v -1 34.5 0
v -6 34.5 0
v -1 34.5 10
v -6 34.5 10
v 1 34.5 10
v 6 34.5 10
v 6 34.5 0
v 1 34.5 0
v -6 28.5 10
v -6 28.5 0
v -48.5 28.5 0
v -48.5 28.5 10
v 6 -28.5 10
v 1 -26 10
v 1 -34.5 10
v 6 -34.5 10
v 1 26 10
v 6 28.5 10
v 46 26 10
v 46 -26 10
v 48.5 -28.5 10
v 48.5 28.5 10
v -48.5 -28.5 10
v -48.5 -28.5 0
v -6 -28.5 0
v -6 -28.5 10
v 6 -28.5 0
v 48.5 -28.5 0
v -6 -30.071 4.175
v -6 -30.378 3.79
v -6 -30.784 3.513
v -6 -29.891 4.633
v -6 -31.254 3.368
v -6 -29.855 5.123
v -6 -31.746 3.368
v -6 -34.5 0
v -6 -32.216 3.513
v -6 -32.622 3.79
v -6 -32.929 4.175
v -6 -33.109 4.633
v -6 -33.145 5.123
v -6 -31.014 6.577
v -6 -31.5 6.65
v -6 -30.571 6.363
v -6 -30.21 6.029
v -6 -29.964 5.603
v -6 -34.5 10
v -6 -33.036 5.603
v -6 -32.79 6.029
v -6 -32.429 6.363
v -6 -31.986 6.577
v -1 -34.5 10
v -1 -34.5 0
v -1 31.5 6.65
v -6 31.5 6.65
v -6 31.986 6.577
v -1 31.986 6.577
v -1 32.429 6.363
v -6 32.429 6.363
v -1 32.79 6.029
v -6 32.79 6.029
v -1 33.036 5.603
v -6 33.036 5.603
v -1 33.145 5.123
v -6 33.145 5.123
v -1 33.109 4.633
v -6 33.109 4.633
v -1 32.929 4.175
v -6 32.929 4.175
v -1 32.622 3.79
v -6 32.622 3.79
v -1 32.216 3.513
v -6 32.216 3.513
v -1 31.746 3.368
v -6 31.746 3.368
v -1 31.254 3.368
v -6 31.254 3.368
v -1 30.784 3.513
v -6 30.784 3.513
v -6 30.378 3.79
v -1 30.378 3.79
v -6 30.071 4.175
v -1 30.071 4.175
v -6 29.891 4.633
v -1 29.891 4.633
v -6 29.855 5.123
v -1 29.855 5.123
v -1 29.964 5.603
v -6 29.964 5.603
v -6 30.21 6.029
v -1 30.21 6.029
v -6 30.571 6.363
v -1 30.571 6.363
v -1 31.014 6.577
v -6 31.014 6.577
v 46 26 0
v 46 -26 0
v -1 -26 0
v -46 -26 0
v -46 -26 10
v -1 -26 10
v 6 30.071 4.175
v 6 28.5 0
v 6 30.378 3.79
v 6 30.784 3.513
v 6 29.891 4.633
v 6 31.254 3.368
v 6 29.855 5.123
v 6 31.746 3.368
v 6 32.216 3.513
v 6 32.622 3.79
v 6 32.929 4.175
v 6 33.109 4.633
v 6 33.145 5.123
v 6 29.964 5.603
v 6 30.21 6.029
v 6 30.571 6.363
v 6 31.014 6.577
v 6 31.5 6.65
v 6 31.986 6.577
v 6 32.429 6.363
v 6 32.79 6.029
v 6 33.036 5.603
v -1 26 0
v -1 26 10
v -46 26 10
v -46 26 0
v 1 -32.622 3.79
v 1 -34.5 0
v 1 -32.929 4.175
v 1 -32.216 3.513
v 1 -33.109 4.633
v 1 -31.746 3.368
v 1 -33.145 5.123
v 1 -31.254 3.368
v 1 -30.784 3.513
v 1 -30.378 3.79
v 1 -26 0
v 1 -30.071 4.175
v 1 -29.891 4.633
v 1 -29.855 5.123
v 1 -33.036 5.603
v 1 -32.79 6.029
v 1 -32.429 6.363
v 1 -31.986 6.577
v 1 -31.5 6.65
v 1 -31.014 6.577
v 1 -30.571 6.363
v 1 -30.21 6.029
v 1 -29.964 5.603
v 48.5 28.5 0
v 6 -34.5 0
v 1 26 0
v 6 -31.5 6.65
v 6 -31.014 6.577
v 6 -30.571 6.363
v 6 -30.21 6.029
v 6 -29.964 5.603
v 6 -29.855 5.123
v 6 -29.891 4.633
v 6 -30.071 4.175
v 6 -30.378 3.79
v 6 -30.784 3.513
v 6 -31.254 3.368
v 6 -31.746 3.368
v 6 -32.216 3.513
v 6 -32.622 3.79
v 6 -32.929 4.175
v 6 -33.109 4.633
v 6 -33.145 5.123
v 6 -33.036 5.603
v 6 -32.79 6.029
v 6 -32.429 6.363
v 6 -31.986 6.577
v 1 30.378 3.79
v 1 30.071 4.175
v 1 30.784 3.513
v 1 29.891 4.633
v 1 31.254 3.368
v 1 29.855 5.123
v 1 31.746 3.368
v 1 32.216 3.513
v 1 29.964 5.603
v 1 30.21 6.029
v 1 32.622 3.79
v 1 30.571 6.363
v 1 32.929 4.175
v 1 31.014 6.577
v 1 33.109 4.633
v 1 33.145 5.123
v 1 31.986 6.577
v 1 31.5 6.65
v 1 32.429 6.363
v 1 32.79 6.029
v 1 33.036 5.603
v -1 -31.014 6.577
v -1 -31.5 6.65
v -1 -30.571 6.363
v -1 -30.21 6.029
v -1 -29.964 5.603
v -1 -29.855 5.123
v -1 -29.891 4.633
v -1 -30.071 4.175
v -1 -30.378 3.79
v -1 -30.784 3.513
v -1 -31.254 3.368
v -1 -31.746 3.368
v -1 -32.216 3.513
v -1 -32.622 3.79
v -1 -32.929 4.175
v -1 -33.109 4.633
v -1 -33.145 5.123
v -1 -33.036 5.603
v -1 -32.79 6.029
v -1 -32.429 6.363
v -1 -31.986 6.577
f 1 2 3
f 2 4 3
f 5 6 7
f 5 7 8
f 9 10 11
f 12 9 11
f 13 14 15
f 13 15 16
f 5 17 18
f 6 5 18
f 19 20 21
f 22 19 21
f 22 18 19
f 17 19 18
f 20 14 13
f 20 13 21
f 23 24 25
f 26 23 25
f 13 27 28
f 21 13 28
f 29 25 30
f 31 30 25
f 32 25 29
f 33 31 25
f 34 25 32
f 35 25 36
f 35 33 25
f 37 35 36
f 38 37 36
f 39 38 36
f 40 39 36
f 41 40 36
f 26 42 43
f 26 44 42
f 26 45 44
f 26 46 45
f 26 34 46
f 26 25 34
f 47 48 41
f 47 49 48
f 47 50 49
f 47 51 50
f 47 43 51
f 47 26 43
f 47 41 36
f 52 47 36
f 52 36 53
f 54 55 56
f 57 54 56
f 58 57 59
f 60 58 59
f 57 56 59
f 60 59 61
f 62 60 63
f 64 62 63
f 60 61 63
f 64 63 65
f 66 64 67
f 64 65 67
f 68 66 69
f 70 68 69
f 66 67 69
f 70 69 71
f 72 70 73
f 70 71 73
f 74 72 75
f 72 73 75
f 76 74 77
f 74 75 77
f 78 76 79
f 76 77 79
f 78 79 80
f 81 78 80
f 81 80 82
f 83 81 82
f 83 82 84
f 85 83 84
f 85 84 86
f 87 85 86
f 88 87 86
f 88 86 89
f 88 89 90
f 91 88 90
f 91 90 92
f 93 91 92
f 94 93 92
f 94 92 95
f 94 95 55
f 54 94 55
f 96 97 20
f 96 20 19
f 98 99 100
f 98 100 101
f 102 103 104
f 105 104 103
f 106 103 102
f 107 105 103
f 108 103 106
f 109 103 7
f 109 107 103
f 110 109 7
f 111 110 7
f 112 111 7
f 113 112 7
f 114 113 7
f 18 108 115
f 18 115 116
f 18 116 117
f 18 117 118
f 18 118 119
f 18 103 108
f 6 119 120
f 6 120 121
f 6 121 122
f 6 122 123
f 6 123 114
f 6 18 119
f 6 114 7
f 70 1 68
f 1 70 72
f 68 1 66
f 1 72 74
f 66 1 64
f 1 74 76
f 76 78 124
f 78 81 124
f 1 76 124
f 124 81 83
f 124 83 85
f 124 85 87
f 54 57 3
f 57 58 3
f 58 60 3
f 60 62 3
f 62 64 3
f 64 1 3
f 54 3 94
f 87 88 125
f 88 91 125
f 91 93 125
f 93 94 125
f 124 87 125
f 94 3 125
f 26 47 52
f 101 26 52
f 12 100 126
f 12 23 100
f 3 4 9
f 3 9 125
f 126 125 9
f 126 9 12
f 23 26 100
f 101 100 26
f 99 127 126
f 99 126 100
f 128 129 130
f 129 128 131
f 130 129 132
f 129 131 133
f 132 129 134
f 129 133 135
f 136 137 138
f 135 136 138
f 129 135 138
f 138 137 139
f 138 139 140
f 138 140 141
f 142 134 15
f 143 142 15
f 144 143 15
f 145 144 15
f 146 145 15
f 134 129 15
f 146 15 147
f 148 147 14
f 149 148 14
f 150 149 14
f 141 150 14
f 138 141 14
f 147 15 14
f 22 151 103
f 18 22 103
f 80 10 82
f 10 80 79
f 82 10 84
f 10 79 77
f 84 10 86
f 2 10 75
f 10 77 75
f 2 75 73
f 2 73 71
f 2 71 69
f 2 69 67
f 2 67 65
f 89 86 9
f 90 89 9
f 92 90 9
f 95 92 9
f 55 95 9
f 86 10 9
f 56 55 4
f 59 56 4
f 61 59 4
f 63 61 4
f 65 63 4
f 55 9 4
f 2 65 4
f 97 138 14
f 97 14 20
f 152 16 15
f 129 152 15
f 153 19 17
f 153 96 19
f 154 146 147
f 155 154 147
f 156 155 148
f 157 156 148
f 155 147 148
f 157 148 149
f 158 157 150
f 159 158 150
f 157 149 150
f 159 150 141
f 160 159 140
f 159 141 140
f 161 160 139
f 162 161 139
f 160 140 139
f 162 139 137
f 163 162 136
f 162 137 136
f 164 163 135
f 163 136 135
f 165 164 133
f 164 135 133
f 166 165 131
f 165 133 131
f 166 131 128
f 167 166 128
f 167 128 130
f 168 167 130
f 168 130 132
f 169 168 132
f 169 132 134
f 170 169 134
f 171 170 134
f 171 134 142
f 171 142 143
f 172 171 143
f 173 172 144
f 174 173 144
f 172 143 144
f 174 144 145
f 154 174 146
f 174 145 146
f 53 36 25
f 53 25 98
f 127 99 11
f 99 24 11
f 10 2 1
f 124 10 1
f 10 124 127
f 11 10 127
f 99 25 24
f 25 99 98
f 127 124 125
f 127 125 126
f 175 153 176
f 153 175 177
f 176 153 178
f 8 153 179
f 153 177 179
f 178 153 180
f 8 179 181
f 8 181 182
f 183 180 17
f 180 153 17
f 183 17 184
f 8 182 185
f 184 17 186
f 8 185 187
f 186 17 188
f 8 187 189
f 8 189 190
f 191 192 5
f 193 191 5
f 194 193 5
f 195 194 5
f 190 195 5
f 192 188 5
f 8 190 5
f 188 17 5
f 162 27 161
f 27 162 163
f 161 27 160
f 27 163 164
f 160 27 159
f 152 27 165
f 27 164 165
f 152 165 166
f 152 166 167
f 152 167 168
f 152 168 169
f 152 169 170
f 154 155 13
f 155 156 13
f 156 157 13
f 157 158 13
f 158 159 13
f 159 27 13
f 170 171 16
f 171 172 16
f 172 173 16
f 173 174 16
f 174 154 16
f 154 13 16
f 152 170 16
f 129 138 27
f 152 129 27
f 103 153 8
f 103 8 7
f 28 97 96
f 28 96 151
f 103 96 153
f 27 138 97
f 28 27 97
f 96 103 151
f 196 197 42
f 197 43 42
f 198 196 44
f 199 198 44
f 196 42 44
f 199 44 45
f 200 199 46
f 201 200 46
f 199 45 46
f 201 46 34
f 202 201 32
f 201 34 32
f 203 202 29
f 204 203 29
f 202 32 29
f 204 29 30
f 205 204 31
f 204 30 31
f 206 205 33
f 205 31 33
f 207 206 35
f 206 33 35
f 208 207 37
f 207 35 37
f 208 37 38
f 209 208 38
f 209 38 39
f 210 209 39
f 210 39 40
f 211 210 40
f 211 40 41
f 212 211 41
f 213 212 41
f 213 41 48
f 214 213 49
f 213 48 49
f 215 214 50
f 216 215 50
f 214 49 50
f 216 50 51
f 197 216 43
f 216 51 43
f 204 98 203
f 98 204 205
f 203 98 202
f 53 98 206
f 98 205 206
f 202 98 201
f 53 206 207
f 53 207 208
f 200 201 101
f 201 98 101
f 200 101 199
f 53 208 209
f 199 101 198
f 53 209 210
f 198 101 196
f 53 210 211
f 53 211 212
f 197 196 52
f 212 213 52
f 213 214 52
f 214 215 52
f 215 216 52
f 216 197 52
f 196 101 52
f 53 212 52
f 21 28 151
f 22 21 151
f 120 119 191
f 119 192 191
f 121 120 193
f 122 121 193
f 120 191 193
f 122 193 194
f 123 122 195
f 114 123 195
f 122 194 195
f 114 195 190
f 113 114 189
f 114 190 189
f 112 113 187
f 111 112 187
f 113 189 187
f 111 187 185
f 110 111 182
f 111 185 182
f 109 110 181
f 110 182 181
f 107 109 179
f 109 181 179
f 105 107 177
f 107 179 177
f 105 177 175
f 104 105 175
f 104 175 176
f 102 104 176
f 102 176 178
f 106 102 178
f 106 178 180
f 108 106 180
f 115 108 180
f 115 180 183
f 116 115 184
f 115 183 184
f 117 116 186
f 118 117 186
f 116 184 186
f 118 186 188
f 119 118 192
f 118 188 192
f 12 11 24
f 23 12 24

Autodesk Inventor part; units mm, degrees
ref_plane "YZ Plane" through (0, 0, 0) normal (1, 0, 0) x (0, 1, 0)
ref_plane "XZ Plane" through (0, 0, 0) normal (0, 1, 0) x (-1, 0, 0)
ref_plane "XY Plane" through (0, 0, 0) normal (0, 0, 1) x (1, 0, 0)
sketch "Sketch6" plane through (0, 0, 0) normal (0, 0, 1) x (1, 0, 0)
  line L0 (-46, -26) -> (46, -26)
  line L1 (46, -26) -> (46, 26)
  line L2 (46, 26) -> (-46, 26)
  line L3 (-46, 26) -> (-46, -26)
  line L4 (-46, -26) -> (46, 26) construction
  line L5 (46, -26) -> (-46, 26) construction
  line L6 (-48.5, -28.5) -> (48.5, -28.5)
  line L7 (48.5, -28.5) -> (48.5, 28.5)
  line L8 (48.5, 28.5) -> (-48.5, 28.5)
  line L9 (-48.5, 28.5) -> (-48.5, -28.5)
  line L10 (-48.5, -28.5) -> (48.5, 28.5) construction
  line L11 (48.5, -28.5) -> (-48.5, 28.5) construction
  point P0 (0, 0)
  dimension "d35" = 2.5
  dimension "d36" = 2.5
  dimension "d37" = 52
  dimension "d38" = 92
extrude "Extrusion6" add sketch "Sketch6" along normal blind 10
sketch "Sketch7" plane through (0, 0, 10) normal (0, 0, 1) x (1, 0, 0)
  line L0 (-1, -49.9526) -> (1, -49.9526)
  line L1 (1, -49.9526) -> (1, 49.9526)
  line L2 (1, 49.9526) -> (-1, 49.9526)
  line L3 (-1, 49.9526) -> (-1, -49.9526)
  line L4 (-1, -49.9526) -> (1, 49.9526) construction
  line L5 (1, -49.9526) -> (-1, 49.9526) construction
  point P0 (0, 0)
  dimension "d41" = 2
extrude "Extrusion7" cut sketch "Sketch7" against normal through all
sketch "Sketch8" plane through (0, 0, 10) normal (0, 0, 1) x (1, 0, 0)
  line L0 (-1, 28.5) -> (-48.5, 28.5) projected
  line L1 (-1, 28.5) -> (-6, 28.5)
  line L2 (-6, 28.5) -> (-6, 34.5)
  line L3 (-6, 34.5) -> (-1, 34.5)
  line L4 (-1, 34.5) -> (-1, 28.5)
  line L5 (48.5, 28.5) -> (1, 28.5) projected
  line L6 (1, 28.5) -> (6, 28.5)
  line L7 (6, 28.5) -> (6, 34.5)
  line L8 (6, 34.5) -> (1, 34.5)
  line L9 (1, 34.5) -> (1, 28.5)
  line L10 (-1, -26) -> (-1, -28.5) projected
  line L11 (-1, -28.5) -> (-6, -28.5)
  line L12 (-6, -28.5) -> (-6, -34.5)
  line L13 (-6, -34.5) -> (-1, -34.5)
  line L14 (-1, -34.5) -> (-1, -28.5)
  line L15 (1, -28.5) -> (48.5, -28.5) projected
  line L16 (1, -28.5) -> (6, -28.5)
  line L17 (6, -28.5) -> (6, -34.5)
  line L18 (6, -34.5) -> (1, -34.5)
  line L19 (1, -34.5) -> (1, -28.5)
  point P0 (0, 0)
  dimension "d44" = 5
  dimension "d45" = 6
extrude "Extrusion8" add sketch "Sketch8" against normal up to surface (10 mm away)
sketch "Sketch9" plane through (-6, -34.5, 10) normal (-1, 0, 0) x (0, 0, 1)
  line L0 (0, 69) -> (-10, 69) construction
  line L1 (-5, 69) -> (-5, 63) construction
  line L2 (0, 63) -> (-10, 63) construction
  line L3 (-10, 6) -> (0, 6) construction
  line L4 (-5, 6) -> (-5, 0) construction
  line L5 (0, 0) -> (-10, 0) construction
  circle A0 centre (-5, 3) radius 1.65
  circle A1 centre (-5, 66) radius 1.65
  point P0 (-10, 34.5)
  dimension "d48" = 3.3
extrude "Extrusion9" cut sketch "Sketch9" against normal through all
equation "\"d36\" = d35"
properties part number "proto_clamp"
